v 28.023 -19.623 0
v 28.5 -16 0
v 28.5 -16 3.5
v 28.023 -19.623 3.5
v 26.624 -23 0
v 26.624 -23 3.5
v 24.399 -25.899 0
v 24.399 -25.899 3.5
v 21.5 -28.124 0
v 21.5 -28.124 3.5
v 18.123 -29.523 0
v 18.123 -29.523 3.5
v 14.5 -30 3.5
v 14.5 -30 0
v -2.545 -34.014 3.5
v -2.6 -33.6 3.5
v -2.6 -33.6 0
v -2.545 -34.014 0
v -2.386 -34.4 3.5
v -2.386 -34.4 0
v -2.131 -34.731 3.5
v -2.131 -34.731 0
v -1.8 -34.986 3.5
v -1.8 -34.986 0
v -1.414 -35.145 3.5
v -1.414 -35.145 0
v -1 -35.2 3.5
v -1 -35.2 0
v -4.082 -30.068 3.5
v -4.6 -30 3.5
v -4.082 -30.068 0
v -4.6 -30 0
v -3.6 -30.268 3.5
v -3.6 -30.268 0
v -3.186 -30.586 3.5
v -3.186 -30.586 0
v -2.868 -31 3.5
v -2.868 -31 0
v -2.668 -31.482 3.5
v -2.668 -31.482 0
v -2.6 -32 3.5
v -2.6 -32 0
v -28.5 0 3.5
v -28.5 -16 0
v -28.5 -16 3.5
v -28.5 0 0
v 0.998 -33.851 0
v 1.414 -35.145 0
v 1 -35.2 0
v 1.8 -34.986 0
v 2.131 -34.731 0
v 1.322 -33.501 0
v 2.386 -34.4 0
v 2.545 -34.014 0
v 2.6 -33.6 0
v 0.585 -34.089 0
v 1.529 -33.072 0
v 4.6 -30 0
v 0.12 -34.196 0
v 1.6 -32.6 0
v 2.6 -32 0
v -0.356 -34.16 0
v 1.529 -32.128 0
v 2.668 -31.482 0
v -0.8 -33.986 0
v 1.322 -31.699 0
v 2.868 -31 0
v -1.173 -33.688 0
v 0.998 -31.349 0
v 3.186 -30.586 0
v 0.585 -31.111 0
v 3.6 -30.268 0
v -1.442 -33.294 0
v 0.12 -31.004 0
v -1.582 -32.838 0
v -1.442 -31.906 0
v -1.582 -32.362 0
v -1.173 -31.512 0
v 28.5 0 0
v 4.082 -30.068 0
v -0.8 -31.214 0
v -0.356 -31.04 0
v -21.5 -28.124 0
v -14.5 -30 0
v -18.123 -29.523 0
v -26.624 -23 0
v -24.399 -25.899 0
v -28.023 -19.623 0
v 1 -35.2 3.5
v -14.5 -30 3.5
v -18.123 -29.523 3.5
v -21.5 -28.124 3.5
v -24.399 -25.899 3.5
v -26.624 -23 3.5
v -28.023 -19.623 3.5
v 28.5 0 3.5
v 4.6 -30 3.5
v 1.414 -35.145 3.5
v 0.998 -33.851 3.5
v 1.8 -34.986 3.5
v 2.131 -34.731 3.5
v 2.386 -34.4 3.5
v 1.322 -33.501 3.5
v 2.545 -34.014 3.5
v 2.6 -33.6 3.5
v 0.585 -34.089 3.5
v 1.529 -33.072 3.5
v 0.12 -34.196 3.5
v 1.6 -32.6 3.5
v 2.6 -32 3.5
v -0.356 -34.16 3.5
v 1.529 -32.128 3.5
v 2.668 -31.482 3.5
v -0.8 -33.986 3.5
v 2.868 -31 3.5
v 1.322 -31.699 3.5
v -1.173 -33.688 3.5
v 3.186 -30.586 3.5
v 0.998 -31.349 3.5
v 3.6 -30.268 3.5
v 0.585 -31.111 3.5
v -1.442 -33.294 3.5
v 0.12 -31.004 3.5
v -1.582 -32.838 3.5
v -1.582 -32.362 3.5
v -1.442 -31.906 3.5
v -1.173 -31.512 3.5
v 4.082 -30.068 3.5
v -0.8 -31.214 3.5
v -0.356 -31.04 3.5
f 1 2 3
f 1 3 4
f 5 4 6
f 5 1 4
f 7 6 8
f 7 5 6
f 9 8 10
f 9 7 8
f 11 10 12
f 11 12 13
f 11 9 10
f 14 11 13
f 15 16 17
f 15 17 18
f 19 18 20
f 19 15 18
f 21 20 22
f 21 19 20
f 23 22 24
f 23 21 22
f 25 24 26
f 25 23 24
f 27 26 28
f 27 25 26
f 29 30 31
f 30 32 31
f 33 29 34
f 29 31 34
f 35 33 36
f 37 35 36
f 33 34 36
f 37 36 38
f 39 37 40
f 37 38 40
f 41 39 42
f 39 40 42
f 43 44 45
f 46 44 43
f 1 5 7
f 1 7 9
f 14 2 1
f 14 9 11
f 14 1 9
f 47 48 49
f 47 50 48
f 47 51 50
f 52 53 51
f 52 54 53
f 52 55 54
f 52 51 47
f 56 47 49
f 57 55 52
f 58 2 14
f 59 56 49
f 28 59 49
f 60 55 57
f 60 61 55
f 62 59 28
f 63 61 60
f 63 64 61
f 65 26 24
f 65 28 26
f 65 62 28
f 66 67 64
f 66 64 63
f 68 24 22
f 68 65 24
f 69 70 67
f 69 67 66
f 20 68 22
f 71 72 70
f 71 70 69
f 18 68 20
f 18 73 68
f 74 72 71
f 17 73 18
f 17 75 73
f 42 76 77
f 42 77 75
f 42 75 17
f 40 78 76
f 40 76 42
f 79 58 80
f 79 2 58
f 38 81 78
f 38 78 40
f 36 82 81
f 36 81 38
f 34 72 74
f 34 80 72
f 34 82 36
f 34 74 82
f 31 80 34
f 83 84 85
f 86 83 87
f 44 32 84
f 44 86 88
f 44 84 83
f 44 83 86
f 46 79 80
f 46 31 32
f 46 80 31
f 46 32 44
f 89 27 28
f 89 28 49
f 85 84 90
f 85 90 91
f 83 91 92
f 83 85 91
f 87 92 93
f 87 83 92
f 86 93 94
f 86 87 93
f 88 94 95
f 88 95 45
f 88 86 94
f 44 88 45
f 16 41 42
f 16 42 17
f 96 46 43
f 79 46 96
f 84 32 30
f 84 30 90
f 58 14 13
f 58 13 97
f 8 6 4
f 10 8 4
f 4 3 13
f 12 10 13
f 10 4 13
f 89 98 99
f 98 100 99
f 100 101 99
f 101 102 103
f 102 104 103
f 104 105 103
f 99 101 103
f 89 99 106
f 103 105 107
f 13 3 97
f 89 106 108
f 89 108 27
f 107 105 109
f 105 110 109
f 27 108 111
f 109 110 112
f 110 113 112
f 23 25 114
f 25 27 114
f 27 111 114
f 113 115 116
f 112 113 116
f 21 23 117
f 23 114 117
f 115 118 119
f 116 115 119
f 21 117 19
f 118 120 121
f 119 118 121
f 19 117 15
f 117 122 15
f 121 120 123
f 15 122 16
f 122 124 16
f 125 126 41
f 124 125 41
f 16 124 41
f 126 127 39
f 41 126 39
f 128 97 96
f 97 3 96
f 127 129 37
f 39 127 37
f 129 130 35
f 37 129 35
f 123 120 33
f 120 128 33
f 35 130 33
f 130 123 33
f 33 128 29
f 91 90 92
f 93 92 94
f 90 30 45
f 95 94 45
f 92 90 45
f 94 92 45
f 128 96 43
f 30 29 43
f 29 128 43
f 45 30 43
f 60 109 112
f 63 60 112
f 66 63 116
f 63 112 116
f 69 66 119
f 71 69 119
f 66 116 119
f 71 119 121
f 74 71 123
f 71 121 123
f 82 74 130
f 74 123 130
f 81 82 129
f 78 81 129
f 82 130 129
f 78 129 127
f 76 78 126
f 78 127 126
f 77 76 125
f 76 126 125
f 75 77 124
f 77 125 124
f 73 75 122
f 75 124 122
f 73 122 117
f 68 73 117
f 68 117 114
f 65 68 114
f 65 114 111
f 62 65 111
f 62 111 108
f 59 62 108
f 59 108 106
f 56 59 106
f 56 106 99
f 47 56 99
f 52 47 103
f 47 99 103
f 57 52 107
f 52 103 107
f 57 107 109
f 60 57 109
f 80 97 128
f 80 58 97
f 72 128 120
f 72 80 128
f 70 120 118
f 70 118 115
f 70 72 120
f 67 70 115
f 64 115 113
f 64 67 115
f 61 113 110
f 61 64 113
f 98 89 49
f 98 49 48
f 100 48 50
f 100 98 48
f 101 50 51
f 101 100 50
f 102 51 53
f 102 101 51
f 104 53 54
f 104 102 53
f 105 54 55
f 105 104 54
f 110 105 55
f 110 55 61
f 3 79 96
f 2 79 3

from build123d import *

# Parameters (mm, degrees)
BOSS_EXTRUDE1_DEPTH = 3.5
SKETCH2_R           = 1.6
BOSS_EXTRUDE2_DEPTH = 3.5
FILLET1_R           = 2


with BuildPart() as part:
    # Sketch1 → Boss-Extrude1 (new body)
    with BuildSketch(Plane.XY):
        with BuildLine():
            Line((-24.5, 0), (24.5, 0))
            Line((24.5, 0), (28.5, 0))
            Line((28.5, 0), (28.5, -16))
            ThreePointArc((28.5, -16), (24.399494937, -25.899494937), (14.5, -30))
            Line((14.5, -30), (-14.5, -30))
            ThreePointArc((-14.5, -30), (-24.399494937, -25.899494937), (-28.5, -16))
            Line((-28.5, -16), (-28.5, 0))
            Line((-28.5, 0), (-24.5, 0))
        make_face()
    extrude(amount=BOSS_EXTRUDE1_DEPTH)

    # Sketch2 → Boss-Extrude2 (add)
    with BuildSketch(Plane.XY.offset(3.5)):
        with BuildLine():
            Line((2.6, -30), (-2.6, -30))
            Line((-2.6, -30), (-2.6, -33.6))
            ThreePointArc((-2.6, -33.6), (-2.13137085, -34.73137085), (-1, -35.2))
            Line((-1, -35.2), (1, -35.2))
            ThreePointArc((1, -35.2), (2.13137085, -34.73137085), (2.6, -33.6))
            Line((2.6, -33.6), (2.6, -30))
        make_face()
        with Locations((0, -32.6)):
            Circle(SKETCH2_R, mode=Mode.SUBTRACT)
    extrude(amount=-BOSS_EXTRUDE2_DEPTH)

    # Fillet1
    fillet1_edges = [part.edges().sort_by_distance(p)[0] for p in [
        (2.6, -30, 1.75),
        (-2.6, -30, 1.75),
    ]]
    fillet(fillet1_edges, radius=FILLET1_R)


solid = part.part
